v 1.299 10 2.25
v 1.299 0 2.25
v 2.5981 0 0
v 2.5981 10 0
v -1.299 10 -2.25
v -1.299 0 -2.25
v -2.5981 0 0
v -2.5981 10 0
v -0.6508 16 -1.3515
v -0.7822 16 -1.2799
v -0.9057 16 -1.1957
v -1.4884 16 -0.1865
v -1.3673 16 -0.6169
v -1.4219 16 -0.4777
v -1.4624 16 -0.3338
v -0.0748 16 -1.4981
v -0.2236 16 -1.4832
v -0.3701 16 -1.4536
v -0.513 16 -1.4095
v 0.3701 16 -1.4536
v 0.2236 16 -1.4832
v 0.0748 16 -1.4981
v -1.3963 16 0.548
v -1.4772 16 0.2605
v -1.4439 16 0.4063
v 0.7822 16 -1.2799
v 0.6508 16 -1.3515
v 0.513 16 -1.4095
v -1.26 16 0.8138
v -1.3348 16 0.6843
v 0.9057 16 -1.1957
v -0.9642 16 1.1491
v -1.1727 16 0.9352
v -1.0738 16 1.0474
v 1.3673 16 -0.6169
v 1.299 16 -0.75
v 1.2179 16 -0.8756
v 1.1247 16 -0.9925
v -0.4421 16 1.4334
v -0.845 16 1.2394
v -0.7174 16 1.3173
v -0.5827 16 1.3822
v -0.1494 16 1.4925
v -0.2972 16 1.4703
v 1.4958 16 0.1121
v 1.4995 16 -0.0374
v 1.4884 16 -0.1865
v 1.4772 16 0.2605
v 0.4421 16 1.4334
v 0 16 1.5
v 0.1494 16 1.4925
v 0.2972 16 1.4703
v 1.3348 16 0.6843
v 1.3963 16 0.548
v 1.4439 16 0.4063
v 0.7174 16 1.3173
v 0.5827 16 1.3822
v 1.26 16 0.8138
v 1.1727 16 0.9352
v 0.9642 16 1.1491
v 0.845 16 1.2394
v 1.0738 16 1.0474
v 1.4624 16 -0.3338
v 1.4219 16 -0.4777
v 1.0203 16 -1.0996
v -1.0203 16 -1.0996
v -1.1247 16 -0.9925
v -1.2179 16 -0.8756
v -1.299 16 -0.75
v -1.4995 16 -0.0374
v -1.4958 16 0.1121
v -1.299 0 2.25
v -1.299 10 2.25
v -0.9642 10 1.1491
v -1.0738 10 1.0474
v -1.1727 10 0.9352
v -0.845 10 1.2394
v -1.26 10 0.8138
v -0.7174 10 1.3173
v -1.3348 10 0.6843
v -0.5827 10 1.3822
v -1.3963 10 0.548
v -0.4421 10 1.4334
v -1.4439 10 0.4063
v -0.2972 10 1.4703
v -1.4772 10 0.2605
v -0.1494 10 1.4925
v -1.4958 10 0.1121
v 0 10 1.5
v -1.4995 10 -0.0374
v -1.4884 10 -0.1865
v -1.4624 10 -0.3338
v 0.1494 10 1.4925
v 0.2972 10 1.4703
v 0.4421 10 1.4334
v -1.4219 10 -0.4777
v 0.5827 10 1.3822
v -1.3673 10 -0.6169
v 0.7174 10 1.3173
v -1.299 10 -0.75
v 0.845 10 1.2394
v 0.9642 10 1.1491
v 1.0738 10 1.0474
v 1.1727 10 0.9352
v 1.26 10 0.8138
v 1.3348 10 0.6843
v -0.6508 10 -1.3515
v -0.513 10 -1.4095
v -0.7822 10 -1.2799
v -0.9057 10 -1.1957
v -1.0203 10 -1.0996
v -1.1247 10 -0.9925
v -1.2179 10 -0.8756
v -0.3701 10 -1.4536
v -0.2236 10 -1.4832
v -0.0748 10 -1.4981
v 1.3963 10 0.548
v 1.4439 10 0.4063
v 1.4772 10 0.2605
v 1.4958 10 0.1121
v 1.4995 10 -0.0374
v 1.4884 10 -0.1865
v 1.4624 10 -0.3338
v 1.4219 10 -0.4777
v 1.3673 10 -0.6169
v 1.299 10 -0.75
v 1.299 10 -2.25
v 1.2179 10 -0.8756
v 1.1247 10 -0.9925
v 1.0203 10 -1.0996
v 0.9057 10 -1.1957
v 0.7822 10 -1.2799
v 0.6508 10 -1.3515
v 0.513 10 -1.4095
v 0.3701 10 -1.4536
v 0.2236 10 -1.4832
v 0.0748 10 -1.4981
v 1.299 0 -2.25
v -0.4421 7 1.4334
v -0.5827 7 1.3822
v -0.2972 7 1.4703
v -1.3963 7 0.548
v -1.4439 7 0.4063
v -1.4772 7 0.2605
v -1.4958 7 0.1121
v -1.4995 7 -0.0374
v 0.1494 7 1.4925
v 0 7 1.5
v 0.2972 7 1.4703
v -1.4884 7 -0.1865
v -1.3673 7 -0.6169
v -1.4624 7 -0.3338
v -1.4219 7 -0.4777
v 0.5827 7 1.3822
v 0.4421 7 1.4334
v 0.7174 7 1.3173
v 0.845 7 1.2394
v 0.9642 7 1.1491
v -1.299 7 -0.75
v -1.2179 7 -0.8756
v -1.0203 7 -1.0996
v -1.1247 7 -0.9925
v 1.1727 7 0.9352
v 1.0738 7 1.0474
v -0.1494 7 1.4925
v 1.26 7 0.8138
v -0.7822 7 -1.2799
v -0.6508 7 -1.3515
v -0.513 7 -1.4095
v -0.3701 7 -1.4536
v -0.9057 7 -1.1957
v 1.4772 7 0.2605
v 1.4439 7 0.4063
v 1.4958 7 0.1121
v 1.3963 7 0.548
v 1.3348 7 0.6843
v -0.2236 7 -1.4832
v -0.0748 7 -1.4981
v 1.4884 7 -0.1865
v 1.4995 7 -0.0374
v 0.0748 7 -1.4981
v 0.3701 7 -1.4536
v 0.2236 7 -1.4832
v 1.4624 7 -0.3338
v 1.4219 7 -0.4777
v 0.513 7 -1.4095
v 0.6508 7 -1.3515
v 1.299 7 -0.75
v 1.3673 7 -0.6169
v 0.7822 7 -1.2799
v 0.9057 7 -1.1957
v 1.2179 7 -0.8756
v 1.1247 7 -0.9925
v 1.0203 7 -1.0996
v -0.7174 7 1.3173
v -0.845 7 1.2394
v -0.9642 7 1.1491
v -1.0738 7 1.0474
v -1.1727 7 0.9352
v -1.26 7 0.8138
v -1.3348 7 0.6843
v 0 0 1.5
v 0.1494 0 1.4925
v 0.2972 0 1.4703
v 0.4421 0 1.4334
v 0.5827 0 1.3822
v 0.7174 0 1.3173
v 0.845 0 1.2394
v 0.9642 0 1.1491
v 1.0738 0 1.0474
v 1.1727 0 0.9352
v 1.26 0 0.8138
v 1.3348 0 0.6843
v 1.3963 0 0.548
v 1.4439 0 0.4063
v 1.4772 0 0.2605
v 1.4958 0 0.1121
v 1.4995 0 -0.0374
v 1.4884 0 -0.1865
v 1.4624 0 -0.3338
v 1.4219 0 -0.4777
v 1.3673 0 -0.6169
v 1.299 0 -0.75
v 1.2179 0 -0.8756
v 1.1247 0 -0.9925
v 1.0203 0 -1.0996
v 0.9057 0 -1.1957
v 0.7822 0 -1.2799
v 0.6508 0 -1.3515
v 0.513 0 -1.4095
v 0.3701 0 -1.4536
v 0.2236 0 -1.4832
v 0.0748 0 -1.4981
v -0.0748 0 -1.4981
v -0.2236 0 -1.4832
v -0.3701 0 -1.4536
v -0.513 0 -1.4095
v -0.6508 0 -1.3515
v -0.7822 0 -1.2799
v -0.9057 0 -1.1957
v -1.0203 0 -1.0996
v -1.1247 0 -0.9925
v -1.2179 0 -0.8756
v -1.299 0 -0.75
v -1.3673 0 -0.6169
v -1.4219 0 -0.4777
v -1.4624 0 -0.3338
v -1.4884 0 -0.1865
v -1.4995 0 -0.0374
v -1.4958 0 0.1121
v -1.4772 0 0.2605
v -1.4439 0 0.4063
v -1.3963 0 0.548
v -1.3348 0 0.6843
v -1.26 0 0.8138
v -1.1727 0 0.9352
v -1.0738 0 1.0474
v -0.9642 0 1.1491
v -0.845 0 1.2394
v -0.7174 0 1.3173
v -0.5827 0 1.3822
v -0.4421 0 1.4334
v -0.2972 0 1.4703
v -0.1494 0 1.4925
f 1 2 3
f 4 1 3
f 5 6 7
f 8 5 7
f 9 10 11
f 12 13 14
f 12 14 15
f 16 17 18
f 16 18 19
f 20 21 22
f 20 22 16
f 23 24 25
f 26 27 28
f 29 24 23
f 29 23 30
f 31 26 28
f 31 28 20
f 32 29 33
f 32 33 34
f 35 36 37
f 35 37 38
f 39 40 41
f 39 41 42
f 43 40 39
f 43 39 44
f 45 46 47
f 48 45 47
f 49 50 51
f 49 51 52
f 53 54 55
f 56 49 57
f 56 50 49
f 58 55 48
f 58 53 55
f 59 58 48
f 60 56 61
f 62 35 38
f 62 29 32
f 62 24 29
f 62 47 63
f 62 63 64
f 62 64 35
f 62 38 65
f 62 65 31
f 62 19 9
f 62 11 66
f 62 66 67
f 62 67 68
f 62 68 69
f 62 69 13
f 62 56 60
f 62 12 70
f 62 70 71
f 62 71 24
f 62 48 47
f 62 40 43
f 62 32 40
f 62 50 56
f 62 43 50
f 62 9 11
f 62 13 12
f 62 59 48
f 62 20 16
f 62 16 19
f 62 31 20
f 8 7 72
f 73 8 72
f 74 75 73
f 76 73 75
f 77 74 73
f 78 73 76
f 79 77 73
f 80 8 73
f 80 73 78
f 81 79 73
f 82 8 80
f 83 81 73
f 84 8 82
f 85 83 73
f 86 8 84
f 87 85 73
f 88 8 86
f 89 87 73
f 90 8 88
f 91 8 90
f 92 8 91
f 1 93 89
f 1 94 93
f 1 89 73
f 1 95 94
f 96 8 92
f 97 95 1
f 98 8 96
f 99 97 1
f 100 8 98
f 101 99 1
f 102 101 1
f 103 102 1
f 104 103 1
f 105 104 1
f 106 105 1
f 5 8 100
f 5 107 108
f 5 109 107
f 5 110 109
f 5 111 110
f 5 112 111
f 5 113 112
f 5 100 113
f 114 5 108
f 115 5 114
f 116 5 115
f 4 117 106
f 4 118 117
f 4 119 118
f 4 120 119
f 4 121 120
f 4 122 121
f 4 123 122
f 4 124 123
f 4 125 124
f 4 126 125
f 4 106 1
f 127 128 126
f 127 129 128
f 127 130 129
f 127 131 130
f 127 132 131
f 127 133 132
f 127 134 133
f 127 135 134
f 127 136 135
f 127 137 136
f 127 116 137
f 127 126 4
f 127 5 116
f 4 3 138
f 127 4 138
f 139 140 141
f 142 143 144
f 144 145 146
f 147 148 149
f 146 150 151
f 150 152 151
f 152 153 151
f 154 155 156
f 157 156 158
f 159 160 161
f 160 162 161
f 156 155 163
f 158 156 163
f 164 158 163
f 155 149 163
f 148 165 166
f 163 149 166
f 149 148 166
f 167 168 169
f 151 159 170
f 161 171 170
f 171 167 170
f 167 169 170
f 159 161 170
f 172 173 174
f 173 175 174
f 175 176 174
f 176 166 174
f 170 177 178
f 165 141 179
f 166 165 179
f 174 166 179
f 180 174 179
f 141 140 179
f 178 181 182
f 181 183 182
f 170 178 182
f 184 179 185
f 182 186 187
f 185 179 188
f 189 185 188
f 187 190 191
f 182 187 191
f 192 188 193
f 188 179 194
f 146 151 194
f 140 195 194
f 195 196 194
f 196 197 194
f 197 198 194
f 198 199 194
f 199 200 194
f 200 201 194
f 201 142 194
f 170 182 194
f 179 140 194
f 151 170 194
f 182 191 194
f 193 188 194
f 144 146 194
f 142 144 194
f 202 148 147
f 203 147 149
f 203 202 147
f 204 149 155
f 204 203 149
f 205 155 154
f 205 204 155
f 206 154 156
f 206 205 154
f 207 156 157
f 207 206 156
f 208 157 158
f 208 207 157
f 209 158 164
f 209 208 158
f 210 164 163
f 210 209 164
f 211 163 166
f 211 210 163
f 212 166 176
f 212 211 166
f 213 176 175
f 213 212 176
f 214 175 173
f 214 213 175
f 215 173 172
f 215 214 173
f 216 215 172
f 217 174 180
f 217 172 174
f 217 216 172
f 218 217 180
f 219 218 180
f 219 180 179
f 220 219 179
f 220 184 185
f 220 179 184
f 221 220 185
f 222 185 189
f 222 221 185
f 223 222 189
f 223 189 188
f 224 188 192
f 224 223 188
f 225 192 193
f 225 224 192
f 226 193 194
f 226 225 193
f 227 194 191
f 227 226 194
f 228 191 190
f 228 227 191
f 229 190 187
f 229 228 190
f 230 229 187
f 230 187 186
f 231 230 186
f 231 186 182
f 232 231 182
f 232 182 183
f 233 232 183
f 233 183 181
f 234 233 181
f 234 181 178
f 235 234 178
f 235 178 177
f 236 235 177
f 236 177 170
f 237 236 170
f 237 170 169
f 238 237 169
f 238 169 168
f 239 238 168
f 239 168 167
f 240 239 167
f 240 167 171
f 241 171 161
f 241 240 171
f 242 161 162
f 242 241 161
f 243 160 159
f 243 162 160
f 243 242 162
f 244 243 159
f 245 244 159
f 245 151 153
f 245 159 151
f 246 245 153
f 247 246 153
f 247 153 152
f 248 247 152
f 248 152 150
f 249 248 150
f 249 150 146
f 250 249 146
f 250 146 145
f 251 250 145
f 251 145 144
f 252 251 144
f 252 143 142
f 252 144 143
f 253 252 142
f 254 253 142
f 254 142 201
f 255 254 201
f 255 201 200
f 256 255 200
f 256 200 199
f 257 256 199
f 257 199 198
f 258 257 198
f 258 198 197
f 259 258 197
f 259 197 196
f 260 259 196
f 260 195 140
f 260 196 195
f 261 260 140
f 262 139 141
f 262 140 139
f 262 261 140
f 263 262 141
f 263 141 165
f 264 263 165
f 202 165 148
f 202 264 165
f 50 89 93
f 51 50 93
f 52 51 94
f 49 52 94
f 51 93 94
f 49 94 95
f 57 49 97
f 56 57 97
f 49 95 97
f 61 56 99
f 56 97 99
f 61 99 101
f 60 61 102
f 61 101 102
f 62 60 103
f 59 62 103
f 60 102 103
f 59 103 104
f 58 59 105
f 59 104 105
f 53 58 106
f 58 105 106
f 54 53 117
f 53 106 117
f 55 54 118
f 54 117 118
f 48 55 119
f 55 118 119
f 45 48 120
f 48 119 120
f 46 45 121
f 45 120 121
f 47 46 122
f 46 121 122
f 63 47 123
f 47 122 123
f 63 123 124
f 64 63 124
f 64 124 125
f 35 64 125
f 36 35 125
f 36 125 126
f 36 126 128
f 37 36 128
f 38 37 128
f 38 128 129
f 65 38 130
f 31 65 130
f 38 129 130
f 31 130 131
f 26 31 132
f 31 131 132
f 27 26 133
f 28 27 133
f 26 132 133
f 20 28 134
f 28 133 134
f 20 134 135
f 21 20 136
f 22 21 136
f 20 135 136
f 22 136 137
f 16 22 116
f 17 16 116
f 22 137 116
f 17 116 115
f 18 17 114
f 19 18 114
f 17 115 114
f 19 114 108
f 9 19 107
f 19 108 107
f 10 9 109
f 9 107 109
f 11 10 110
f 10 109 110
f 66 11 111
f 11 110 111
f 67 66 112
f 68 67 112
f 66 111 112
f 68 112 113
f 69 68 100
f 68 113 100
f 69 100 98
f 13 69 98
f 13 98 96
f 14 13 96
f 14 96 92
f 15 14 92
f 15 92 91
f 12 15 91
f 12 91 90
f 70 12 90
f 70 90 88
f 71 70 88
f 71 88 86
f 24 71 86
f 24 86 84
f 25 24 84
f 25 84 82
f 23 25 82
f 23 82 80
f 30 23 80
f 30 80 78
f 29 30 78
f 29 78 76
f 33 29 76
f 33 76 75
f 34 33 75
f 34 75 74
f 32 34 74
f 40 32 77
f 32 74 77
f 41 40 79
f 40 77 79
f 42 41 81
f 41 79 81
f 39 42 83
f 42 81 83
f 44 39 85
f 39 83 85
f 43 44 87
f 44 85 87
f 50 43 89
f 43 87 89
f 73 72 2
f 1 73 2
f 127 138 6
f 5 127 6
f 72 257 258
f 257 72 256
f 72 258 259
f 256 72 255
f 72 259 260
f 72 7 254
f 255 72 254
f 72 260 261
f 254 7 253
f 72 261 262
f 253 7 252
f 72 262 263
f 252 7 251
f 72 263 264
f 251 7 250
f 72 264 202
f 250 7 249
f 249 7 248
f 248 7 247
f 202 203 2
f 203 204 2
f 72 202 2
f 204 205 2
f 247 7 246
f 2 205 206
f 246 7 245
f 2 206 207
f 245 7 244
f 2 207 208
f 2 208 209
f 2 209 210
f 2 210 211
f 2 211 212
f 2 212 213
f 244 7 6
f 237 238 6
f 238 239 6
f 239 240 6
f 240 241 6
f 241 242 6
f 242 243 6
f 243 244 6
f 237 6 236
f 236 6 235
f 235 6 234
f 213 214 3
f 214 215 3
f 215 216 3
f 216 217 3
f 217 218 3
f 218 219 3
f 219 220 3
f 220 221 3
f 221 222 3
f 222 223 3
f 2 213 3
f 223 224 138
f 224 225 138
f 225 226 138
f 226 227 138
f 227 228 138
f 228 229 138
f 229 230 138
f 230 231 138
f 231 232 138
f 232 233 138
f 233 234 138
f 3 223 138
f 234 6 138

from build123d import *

# Parameters (mm, degrees)
SKETCH1_R           = 1.5
BOSS_EXTRUDE1_DEPTH = 10
BOSS_EXTRUDE2_DEPTH = 3
SKETCH3_R           = 1.5
BOSS_EXTRUDE3_DEPTH = 6


with BuildPart() as part:
    # Sketch1 → Boss-Extrude1 (new body)
    with BuildSketch(Plane(origin=(0, 0, 0), x_dir=(1, 0, 0), z_dir=(0, 1, 0))):
        Polygon((2.598076211, 0), (1.299038106, 2.25), (-1.299038106, 2.25), (-2.598076211, 0), (-1.299038106, -2.25), (1.299038106, -2.25), align=None)
        with Locations(Location((0, 0, 0), (0, 0, 270))):
            Circle(SKETCH1_R, mode=Mode.SUBTRACT)
    extrude(amount=BOSS_EXTRUDE1_DEPTH)

    # Sketch2 → Boss-Extrude2 (add)
    with BuildSketch(Plane(origin=(0, 10, 0), x_dir=(1, 0, 0), z_dir=(0, 1, 0))):
        Polygon((2.598076211, 0), (1.299038106, 2.25), (-1.299038106, 2.25), (-2.598076211, 0), (-1.299038106, -2.25), (1.299038106, -2.25), align=None)
    extrude(amount=-BOSS_EXTRUDE2_DEPTH)

    # Sketch3 → Boss-Extrude3 (add)
    with BuildSketch(Plane(origin=(0, 10, 0), x_dir=(1, 0, 0), z_dir=(0, 1, 0))):
        with Locations(Location((0, 0, 0), (0, 0, 270))):
            Circle(SKETCH3_R)
    extrude(amount=BOSS_EXTRUDE3_DEPTH)


solid = part.part
